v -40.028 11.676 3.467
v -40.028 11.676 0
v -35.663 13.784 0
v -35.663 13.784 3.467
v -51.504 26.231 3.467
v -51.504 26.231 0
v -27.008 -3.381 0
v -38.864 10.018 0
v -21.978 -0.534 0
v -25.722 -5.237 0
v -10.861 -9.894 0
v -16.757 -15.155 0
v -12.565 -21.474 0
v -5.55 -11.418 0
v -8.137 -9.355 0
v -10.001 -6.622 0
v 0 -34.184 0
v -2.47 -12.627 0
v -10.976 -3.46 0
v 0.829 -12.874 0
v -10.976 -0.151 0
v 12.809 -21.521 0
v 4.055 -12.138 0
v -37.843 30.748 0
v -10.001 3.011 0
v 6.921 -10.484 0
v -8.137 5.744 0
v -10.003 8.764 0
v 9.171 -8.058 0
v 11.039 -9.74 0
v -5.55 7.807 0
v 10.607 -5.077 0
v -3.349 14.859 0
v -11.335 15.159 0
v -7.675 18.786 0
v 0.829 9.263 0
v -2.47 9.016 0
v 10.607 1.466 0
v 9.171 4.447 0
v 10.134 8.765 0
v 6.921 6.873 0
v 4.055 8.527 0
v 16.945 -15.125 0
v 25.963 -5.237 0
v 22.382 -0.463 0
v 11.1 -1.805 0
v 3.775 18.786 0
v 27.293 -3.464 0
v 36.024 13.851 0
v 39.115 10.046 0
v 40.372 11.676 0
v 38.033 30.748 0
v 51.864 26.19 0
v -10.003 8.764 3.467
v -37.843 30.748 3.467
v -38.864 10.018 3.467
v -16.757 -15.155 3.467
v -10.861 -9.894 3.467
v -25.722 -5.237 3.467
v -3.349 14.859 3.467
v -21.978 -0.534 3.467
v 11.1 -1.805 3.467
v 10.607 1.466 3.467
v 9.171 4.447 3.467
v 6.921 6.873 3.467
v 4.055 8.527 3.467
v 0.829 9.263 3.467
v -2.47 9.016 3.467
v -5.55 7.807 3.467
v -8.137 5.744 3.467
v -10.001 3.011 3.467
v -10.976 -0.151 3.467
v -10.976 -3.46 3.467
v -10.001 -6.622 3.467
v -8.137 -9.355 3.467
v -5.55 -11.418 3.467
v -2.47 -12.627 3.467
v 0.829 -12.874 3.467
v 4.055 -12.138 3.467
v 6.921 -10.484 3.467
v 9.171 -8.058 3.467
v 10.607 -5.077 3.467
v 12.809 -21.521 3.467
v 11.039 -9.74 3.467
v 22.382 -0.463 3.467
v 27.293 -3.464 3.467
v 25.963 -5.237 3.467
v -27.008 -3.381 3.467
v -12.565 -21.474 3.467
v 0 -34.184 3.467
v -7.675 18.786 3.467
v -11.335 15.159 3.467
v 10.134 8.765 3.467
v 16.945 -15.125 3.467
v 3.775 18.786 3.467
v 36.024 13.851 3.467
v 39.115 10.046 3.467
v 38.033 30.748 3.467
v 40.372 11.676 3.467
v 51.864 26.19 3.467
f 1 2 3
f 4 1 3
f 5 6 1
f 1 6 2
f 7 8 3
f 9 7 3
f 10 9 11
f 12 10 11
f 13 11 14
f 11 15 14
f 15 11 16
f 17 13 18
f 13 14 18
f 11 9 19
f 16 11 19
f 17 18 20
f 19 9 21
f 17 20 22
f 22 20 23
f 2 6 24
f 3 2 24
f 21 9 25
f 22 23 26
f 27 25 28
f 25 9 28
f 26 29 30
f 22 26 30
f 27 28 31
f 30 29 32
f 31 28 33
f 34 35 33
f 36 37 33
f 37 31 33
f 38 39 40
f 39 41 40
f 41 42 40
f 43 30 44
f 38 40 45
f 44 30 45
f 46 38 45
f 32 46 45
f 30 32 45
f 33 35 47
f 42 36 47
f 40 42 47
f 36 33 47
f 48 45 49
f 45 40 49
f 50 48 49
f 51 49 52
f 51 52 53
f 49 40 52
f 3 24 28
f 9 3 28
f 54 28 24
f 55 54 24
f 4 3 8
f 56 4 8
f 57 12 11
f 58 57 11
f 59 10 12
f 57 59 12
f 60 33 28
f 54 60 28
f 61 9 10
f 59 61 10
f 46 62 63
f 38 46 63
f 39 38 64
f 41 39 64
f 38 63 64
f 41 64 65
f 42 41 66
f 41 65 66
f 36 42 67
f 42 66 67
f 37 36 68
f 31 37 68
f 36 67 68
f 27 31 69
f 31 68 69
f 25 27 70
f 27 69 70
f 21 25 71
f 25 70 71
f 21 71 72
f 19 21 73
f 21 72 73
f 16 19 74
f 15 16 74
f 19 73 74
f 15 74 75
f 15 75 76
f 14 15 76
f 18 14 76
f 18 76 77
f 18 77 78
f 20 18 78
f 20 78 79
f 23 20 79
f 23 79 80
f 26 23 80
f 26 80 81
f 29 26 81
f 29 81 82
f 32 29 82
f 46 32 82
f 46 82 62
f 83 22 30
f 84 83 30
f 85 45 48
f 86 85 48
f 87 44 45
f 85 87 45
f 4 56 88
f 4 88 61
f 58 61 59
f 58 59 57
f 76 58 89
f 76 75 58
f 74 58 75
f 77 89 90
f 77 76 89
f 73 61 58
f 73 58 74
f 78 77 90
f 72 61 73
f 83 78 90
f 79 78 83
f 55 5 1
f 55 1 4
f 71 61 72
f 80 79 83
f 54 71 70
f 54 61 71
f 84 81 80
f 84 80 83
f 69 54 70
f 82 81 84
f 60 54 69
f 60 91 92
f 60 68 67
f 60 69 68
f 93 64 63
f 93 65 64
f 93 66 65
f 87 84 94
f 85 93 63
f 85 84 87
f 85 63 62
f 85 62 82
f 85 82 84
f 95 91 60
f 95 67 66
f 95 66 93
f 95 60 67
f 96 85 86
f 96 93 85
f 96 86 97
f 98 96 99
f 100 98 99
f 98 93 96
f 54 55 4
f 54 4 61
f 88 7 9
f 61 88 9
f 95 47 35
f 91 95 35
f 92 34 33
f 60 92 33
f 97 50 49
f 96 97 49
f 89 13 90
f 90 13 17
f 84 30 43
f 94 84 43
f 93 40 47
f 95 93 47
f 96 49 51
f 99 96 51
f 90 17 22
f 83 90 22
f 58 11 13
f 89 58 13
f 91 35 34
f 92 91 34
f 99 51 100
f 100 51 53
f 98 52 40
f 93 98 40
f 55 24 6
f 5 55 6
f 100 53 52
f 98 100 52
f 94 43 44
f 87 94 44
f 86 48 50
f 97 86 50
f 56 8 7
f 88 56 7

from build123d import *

# Parameters (mm, degrees)
F1_DEPTH = 6.9342
F2_SCALE = 0.5
F3_R     = 11.0998
F4_DEPTH = 25.4


with BuildPart() as f1:
    # F0 (on Top) → F1 (new body)
    with BuildSketch(Plane.XY):
        Polygon((-75.6856215453, 61.495130631), (-103.0089063366, 52.4619456377), (-80.056669942, 23.3529183213), (-71.3269899235, 27.5684058967), (-77.7287712085, 20.0368960855), (-54.0167096295, -6.7615591093), (-43.9553417197, -1.0685261115), (-51.4435459742, -10.473888544), (-33.5140929693, -30.3097563356), (-21.7221314678, -19.7887847189), (-25.1305638593, -42.9484921738), (0, -68.3683384545), (25.6179132403, -43.0419616731), (22.0779453622, -19.4793259238), (33.8894912196, -30.2508644393), (51.9251031665, -10.473888544), (44.763548994, -0.9251482466), (54.5851095356, -6.9272132295), (78.2306868312, 20.0916471891), (72.0478651347, 27.7012792084), (80.7445831733, 23.3529183213), (103.7288850297, 52.37963034), (76.0650205074, 61.495130631), (20.2681753259, 17.5302260523), (7.5507578667, 37.5718755511), (-15.3496812645, 37.5718755511), (-22.6703244303, 30.3177857753), (-6.6980118564, 29.7188239429), (-20.0065281242, 17.5278745592), align=None)
    extrude(amount=F1_DEPTH)


with BuildPart() as f1_1:
    # F2: moved
    add(f1.part.scale(F2_SCALE))

    # F3 (on face) → F4 (cut)
    with BuildSketch(Plane.XY.offset(3.4671)):
        with Locations((0, -1.8054934917)):
            Circle(F3_R)
    extrude(amount=-F4_DEPTH, mode=Mode.SUBTRACT)


solid = f1_1.part
